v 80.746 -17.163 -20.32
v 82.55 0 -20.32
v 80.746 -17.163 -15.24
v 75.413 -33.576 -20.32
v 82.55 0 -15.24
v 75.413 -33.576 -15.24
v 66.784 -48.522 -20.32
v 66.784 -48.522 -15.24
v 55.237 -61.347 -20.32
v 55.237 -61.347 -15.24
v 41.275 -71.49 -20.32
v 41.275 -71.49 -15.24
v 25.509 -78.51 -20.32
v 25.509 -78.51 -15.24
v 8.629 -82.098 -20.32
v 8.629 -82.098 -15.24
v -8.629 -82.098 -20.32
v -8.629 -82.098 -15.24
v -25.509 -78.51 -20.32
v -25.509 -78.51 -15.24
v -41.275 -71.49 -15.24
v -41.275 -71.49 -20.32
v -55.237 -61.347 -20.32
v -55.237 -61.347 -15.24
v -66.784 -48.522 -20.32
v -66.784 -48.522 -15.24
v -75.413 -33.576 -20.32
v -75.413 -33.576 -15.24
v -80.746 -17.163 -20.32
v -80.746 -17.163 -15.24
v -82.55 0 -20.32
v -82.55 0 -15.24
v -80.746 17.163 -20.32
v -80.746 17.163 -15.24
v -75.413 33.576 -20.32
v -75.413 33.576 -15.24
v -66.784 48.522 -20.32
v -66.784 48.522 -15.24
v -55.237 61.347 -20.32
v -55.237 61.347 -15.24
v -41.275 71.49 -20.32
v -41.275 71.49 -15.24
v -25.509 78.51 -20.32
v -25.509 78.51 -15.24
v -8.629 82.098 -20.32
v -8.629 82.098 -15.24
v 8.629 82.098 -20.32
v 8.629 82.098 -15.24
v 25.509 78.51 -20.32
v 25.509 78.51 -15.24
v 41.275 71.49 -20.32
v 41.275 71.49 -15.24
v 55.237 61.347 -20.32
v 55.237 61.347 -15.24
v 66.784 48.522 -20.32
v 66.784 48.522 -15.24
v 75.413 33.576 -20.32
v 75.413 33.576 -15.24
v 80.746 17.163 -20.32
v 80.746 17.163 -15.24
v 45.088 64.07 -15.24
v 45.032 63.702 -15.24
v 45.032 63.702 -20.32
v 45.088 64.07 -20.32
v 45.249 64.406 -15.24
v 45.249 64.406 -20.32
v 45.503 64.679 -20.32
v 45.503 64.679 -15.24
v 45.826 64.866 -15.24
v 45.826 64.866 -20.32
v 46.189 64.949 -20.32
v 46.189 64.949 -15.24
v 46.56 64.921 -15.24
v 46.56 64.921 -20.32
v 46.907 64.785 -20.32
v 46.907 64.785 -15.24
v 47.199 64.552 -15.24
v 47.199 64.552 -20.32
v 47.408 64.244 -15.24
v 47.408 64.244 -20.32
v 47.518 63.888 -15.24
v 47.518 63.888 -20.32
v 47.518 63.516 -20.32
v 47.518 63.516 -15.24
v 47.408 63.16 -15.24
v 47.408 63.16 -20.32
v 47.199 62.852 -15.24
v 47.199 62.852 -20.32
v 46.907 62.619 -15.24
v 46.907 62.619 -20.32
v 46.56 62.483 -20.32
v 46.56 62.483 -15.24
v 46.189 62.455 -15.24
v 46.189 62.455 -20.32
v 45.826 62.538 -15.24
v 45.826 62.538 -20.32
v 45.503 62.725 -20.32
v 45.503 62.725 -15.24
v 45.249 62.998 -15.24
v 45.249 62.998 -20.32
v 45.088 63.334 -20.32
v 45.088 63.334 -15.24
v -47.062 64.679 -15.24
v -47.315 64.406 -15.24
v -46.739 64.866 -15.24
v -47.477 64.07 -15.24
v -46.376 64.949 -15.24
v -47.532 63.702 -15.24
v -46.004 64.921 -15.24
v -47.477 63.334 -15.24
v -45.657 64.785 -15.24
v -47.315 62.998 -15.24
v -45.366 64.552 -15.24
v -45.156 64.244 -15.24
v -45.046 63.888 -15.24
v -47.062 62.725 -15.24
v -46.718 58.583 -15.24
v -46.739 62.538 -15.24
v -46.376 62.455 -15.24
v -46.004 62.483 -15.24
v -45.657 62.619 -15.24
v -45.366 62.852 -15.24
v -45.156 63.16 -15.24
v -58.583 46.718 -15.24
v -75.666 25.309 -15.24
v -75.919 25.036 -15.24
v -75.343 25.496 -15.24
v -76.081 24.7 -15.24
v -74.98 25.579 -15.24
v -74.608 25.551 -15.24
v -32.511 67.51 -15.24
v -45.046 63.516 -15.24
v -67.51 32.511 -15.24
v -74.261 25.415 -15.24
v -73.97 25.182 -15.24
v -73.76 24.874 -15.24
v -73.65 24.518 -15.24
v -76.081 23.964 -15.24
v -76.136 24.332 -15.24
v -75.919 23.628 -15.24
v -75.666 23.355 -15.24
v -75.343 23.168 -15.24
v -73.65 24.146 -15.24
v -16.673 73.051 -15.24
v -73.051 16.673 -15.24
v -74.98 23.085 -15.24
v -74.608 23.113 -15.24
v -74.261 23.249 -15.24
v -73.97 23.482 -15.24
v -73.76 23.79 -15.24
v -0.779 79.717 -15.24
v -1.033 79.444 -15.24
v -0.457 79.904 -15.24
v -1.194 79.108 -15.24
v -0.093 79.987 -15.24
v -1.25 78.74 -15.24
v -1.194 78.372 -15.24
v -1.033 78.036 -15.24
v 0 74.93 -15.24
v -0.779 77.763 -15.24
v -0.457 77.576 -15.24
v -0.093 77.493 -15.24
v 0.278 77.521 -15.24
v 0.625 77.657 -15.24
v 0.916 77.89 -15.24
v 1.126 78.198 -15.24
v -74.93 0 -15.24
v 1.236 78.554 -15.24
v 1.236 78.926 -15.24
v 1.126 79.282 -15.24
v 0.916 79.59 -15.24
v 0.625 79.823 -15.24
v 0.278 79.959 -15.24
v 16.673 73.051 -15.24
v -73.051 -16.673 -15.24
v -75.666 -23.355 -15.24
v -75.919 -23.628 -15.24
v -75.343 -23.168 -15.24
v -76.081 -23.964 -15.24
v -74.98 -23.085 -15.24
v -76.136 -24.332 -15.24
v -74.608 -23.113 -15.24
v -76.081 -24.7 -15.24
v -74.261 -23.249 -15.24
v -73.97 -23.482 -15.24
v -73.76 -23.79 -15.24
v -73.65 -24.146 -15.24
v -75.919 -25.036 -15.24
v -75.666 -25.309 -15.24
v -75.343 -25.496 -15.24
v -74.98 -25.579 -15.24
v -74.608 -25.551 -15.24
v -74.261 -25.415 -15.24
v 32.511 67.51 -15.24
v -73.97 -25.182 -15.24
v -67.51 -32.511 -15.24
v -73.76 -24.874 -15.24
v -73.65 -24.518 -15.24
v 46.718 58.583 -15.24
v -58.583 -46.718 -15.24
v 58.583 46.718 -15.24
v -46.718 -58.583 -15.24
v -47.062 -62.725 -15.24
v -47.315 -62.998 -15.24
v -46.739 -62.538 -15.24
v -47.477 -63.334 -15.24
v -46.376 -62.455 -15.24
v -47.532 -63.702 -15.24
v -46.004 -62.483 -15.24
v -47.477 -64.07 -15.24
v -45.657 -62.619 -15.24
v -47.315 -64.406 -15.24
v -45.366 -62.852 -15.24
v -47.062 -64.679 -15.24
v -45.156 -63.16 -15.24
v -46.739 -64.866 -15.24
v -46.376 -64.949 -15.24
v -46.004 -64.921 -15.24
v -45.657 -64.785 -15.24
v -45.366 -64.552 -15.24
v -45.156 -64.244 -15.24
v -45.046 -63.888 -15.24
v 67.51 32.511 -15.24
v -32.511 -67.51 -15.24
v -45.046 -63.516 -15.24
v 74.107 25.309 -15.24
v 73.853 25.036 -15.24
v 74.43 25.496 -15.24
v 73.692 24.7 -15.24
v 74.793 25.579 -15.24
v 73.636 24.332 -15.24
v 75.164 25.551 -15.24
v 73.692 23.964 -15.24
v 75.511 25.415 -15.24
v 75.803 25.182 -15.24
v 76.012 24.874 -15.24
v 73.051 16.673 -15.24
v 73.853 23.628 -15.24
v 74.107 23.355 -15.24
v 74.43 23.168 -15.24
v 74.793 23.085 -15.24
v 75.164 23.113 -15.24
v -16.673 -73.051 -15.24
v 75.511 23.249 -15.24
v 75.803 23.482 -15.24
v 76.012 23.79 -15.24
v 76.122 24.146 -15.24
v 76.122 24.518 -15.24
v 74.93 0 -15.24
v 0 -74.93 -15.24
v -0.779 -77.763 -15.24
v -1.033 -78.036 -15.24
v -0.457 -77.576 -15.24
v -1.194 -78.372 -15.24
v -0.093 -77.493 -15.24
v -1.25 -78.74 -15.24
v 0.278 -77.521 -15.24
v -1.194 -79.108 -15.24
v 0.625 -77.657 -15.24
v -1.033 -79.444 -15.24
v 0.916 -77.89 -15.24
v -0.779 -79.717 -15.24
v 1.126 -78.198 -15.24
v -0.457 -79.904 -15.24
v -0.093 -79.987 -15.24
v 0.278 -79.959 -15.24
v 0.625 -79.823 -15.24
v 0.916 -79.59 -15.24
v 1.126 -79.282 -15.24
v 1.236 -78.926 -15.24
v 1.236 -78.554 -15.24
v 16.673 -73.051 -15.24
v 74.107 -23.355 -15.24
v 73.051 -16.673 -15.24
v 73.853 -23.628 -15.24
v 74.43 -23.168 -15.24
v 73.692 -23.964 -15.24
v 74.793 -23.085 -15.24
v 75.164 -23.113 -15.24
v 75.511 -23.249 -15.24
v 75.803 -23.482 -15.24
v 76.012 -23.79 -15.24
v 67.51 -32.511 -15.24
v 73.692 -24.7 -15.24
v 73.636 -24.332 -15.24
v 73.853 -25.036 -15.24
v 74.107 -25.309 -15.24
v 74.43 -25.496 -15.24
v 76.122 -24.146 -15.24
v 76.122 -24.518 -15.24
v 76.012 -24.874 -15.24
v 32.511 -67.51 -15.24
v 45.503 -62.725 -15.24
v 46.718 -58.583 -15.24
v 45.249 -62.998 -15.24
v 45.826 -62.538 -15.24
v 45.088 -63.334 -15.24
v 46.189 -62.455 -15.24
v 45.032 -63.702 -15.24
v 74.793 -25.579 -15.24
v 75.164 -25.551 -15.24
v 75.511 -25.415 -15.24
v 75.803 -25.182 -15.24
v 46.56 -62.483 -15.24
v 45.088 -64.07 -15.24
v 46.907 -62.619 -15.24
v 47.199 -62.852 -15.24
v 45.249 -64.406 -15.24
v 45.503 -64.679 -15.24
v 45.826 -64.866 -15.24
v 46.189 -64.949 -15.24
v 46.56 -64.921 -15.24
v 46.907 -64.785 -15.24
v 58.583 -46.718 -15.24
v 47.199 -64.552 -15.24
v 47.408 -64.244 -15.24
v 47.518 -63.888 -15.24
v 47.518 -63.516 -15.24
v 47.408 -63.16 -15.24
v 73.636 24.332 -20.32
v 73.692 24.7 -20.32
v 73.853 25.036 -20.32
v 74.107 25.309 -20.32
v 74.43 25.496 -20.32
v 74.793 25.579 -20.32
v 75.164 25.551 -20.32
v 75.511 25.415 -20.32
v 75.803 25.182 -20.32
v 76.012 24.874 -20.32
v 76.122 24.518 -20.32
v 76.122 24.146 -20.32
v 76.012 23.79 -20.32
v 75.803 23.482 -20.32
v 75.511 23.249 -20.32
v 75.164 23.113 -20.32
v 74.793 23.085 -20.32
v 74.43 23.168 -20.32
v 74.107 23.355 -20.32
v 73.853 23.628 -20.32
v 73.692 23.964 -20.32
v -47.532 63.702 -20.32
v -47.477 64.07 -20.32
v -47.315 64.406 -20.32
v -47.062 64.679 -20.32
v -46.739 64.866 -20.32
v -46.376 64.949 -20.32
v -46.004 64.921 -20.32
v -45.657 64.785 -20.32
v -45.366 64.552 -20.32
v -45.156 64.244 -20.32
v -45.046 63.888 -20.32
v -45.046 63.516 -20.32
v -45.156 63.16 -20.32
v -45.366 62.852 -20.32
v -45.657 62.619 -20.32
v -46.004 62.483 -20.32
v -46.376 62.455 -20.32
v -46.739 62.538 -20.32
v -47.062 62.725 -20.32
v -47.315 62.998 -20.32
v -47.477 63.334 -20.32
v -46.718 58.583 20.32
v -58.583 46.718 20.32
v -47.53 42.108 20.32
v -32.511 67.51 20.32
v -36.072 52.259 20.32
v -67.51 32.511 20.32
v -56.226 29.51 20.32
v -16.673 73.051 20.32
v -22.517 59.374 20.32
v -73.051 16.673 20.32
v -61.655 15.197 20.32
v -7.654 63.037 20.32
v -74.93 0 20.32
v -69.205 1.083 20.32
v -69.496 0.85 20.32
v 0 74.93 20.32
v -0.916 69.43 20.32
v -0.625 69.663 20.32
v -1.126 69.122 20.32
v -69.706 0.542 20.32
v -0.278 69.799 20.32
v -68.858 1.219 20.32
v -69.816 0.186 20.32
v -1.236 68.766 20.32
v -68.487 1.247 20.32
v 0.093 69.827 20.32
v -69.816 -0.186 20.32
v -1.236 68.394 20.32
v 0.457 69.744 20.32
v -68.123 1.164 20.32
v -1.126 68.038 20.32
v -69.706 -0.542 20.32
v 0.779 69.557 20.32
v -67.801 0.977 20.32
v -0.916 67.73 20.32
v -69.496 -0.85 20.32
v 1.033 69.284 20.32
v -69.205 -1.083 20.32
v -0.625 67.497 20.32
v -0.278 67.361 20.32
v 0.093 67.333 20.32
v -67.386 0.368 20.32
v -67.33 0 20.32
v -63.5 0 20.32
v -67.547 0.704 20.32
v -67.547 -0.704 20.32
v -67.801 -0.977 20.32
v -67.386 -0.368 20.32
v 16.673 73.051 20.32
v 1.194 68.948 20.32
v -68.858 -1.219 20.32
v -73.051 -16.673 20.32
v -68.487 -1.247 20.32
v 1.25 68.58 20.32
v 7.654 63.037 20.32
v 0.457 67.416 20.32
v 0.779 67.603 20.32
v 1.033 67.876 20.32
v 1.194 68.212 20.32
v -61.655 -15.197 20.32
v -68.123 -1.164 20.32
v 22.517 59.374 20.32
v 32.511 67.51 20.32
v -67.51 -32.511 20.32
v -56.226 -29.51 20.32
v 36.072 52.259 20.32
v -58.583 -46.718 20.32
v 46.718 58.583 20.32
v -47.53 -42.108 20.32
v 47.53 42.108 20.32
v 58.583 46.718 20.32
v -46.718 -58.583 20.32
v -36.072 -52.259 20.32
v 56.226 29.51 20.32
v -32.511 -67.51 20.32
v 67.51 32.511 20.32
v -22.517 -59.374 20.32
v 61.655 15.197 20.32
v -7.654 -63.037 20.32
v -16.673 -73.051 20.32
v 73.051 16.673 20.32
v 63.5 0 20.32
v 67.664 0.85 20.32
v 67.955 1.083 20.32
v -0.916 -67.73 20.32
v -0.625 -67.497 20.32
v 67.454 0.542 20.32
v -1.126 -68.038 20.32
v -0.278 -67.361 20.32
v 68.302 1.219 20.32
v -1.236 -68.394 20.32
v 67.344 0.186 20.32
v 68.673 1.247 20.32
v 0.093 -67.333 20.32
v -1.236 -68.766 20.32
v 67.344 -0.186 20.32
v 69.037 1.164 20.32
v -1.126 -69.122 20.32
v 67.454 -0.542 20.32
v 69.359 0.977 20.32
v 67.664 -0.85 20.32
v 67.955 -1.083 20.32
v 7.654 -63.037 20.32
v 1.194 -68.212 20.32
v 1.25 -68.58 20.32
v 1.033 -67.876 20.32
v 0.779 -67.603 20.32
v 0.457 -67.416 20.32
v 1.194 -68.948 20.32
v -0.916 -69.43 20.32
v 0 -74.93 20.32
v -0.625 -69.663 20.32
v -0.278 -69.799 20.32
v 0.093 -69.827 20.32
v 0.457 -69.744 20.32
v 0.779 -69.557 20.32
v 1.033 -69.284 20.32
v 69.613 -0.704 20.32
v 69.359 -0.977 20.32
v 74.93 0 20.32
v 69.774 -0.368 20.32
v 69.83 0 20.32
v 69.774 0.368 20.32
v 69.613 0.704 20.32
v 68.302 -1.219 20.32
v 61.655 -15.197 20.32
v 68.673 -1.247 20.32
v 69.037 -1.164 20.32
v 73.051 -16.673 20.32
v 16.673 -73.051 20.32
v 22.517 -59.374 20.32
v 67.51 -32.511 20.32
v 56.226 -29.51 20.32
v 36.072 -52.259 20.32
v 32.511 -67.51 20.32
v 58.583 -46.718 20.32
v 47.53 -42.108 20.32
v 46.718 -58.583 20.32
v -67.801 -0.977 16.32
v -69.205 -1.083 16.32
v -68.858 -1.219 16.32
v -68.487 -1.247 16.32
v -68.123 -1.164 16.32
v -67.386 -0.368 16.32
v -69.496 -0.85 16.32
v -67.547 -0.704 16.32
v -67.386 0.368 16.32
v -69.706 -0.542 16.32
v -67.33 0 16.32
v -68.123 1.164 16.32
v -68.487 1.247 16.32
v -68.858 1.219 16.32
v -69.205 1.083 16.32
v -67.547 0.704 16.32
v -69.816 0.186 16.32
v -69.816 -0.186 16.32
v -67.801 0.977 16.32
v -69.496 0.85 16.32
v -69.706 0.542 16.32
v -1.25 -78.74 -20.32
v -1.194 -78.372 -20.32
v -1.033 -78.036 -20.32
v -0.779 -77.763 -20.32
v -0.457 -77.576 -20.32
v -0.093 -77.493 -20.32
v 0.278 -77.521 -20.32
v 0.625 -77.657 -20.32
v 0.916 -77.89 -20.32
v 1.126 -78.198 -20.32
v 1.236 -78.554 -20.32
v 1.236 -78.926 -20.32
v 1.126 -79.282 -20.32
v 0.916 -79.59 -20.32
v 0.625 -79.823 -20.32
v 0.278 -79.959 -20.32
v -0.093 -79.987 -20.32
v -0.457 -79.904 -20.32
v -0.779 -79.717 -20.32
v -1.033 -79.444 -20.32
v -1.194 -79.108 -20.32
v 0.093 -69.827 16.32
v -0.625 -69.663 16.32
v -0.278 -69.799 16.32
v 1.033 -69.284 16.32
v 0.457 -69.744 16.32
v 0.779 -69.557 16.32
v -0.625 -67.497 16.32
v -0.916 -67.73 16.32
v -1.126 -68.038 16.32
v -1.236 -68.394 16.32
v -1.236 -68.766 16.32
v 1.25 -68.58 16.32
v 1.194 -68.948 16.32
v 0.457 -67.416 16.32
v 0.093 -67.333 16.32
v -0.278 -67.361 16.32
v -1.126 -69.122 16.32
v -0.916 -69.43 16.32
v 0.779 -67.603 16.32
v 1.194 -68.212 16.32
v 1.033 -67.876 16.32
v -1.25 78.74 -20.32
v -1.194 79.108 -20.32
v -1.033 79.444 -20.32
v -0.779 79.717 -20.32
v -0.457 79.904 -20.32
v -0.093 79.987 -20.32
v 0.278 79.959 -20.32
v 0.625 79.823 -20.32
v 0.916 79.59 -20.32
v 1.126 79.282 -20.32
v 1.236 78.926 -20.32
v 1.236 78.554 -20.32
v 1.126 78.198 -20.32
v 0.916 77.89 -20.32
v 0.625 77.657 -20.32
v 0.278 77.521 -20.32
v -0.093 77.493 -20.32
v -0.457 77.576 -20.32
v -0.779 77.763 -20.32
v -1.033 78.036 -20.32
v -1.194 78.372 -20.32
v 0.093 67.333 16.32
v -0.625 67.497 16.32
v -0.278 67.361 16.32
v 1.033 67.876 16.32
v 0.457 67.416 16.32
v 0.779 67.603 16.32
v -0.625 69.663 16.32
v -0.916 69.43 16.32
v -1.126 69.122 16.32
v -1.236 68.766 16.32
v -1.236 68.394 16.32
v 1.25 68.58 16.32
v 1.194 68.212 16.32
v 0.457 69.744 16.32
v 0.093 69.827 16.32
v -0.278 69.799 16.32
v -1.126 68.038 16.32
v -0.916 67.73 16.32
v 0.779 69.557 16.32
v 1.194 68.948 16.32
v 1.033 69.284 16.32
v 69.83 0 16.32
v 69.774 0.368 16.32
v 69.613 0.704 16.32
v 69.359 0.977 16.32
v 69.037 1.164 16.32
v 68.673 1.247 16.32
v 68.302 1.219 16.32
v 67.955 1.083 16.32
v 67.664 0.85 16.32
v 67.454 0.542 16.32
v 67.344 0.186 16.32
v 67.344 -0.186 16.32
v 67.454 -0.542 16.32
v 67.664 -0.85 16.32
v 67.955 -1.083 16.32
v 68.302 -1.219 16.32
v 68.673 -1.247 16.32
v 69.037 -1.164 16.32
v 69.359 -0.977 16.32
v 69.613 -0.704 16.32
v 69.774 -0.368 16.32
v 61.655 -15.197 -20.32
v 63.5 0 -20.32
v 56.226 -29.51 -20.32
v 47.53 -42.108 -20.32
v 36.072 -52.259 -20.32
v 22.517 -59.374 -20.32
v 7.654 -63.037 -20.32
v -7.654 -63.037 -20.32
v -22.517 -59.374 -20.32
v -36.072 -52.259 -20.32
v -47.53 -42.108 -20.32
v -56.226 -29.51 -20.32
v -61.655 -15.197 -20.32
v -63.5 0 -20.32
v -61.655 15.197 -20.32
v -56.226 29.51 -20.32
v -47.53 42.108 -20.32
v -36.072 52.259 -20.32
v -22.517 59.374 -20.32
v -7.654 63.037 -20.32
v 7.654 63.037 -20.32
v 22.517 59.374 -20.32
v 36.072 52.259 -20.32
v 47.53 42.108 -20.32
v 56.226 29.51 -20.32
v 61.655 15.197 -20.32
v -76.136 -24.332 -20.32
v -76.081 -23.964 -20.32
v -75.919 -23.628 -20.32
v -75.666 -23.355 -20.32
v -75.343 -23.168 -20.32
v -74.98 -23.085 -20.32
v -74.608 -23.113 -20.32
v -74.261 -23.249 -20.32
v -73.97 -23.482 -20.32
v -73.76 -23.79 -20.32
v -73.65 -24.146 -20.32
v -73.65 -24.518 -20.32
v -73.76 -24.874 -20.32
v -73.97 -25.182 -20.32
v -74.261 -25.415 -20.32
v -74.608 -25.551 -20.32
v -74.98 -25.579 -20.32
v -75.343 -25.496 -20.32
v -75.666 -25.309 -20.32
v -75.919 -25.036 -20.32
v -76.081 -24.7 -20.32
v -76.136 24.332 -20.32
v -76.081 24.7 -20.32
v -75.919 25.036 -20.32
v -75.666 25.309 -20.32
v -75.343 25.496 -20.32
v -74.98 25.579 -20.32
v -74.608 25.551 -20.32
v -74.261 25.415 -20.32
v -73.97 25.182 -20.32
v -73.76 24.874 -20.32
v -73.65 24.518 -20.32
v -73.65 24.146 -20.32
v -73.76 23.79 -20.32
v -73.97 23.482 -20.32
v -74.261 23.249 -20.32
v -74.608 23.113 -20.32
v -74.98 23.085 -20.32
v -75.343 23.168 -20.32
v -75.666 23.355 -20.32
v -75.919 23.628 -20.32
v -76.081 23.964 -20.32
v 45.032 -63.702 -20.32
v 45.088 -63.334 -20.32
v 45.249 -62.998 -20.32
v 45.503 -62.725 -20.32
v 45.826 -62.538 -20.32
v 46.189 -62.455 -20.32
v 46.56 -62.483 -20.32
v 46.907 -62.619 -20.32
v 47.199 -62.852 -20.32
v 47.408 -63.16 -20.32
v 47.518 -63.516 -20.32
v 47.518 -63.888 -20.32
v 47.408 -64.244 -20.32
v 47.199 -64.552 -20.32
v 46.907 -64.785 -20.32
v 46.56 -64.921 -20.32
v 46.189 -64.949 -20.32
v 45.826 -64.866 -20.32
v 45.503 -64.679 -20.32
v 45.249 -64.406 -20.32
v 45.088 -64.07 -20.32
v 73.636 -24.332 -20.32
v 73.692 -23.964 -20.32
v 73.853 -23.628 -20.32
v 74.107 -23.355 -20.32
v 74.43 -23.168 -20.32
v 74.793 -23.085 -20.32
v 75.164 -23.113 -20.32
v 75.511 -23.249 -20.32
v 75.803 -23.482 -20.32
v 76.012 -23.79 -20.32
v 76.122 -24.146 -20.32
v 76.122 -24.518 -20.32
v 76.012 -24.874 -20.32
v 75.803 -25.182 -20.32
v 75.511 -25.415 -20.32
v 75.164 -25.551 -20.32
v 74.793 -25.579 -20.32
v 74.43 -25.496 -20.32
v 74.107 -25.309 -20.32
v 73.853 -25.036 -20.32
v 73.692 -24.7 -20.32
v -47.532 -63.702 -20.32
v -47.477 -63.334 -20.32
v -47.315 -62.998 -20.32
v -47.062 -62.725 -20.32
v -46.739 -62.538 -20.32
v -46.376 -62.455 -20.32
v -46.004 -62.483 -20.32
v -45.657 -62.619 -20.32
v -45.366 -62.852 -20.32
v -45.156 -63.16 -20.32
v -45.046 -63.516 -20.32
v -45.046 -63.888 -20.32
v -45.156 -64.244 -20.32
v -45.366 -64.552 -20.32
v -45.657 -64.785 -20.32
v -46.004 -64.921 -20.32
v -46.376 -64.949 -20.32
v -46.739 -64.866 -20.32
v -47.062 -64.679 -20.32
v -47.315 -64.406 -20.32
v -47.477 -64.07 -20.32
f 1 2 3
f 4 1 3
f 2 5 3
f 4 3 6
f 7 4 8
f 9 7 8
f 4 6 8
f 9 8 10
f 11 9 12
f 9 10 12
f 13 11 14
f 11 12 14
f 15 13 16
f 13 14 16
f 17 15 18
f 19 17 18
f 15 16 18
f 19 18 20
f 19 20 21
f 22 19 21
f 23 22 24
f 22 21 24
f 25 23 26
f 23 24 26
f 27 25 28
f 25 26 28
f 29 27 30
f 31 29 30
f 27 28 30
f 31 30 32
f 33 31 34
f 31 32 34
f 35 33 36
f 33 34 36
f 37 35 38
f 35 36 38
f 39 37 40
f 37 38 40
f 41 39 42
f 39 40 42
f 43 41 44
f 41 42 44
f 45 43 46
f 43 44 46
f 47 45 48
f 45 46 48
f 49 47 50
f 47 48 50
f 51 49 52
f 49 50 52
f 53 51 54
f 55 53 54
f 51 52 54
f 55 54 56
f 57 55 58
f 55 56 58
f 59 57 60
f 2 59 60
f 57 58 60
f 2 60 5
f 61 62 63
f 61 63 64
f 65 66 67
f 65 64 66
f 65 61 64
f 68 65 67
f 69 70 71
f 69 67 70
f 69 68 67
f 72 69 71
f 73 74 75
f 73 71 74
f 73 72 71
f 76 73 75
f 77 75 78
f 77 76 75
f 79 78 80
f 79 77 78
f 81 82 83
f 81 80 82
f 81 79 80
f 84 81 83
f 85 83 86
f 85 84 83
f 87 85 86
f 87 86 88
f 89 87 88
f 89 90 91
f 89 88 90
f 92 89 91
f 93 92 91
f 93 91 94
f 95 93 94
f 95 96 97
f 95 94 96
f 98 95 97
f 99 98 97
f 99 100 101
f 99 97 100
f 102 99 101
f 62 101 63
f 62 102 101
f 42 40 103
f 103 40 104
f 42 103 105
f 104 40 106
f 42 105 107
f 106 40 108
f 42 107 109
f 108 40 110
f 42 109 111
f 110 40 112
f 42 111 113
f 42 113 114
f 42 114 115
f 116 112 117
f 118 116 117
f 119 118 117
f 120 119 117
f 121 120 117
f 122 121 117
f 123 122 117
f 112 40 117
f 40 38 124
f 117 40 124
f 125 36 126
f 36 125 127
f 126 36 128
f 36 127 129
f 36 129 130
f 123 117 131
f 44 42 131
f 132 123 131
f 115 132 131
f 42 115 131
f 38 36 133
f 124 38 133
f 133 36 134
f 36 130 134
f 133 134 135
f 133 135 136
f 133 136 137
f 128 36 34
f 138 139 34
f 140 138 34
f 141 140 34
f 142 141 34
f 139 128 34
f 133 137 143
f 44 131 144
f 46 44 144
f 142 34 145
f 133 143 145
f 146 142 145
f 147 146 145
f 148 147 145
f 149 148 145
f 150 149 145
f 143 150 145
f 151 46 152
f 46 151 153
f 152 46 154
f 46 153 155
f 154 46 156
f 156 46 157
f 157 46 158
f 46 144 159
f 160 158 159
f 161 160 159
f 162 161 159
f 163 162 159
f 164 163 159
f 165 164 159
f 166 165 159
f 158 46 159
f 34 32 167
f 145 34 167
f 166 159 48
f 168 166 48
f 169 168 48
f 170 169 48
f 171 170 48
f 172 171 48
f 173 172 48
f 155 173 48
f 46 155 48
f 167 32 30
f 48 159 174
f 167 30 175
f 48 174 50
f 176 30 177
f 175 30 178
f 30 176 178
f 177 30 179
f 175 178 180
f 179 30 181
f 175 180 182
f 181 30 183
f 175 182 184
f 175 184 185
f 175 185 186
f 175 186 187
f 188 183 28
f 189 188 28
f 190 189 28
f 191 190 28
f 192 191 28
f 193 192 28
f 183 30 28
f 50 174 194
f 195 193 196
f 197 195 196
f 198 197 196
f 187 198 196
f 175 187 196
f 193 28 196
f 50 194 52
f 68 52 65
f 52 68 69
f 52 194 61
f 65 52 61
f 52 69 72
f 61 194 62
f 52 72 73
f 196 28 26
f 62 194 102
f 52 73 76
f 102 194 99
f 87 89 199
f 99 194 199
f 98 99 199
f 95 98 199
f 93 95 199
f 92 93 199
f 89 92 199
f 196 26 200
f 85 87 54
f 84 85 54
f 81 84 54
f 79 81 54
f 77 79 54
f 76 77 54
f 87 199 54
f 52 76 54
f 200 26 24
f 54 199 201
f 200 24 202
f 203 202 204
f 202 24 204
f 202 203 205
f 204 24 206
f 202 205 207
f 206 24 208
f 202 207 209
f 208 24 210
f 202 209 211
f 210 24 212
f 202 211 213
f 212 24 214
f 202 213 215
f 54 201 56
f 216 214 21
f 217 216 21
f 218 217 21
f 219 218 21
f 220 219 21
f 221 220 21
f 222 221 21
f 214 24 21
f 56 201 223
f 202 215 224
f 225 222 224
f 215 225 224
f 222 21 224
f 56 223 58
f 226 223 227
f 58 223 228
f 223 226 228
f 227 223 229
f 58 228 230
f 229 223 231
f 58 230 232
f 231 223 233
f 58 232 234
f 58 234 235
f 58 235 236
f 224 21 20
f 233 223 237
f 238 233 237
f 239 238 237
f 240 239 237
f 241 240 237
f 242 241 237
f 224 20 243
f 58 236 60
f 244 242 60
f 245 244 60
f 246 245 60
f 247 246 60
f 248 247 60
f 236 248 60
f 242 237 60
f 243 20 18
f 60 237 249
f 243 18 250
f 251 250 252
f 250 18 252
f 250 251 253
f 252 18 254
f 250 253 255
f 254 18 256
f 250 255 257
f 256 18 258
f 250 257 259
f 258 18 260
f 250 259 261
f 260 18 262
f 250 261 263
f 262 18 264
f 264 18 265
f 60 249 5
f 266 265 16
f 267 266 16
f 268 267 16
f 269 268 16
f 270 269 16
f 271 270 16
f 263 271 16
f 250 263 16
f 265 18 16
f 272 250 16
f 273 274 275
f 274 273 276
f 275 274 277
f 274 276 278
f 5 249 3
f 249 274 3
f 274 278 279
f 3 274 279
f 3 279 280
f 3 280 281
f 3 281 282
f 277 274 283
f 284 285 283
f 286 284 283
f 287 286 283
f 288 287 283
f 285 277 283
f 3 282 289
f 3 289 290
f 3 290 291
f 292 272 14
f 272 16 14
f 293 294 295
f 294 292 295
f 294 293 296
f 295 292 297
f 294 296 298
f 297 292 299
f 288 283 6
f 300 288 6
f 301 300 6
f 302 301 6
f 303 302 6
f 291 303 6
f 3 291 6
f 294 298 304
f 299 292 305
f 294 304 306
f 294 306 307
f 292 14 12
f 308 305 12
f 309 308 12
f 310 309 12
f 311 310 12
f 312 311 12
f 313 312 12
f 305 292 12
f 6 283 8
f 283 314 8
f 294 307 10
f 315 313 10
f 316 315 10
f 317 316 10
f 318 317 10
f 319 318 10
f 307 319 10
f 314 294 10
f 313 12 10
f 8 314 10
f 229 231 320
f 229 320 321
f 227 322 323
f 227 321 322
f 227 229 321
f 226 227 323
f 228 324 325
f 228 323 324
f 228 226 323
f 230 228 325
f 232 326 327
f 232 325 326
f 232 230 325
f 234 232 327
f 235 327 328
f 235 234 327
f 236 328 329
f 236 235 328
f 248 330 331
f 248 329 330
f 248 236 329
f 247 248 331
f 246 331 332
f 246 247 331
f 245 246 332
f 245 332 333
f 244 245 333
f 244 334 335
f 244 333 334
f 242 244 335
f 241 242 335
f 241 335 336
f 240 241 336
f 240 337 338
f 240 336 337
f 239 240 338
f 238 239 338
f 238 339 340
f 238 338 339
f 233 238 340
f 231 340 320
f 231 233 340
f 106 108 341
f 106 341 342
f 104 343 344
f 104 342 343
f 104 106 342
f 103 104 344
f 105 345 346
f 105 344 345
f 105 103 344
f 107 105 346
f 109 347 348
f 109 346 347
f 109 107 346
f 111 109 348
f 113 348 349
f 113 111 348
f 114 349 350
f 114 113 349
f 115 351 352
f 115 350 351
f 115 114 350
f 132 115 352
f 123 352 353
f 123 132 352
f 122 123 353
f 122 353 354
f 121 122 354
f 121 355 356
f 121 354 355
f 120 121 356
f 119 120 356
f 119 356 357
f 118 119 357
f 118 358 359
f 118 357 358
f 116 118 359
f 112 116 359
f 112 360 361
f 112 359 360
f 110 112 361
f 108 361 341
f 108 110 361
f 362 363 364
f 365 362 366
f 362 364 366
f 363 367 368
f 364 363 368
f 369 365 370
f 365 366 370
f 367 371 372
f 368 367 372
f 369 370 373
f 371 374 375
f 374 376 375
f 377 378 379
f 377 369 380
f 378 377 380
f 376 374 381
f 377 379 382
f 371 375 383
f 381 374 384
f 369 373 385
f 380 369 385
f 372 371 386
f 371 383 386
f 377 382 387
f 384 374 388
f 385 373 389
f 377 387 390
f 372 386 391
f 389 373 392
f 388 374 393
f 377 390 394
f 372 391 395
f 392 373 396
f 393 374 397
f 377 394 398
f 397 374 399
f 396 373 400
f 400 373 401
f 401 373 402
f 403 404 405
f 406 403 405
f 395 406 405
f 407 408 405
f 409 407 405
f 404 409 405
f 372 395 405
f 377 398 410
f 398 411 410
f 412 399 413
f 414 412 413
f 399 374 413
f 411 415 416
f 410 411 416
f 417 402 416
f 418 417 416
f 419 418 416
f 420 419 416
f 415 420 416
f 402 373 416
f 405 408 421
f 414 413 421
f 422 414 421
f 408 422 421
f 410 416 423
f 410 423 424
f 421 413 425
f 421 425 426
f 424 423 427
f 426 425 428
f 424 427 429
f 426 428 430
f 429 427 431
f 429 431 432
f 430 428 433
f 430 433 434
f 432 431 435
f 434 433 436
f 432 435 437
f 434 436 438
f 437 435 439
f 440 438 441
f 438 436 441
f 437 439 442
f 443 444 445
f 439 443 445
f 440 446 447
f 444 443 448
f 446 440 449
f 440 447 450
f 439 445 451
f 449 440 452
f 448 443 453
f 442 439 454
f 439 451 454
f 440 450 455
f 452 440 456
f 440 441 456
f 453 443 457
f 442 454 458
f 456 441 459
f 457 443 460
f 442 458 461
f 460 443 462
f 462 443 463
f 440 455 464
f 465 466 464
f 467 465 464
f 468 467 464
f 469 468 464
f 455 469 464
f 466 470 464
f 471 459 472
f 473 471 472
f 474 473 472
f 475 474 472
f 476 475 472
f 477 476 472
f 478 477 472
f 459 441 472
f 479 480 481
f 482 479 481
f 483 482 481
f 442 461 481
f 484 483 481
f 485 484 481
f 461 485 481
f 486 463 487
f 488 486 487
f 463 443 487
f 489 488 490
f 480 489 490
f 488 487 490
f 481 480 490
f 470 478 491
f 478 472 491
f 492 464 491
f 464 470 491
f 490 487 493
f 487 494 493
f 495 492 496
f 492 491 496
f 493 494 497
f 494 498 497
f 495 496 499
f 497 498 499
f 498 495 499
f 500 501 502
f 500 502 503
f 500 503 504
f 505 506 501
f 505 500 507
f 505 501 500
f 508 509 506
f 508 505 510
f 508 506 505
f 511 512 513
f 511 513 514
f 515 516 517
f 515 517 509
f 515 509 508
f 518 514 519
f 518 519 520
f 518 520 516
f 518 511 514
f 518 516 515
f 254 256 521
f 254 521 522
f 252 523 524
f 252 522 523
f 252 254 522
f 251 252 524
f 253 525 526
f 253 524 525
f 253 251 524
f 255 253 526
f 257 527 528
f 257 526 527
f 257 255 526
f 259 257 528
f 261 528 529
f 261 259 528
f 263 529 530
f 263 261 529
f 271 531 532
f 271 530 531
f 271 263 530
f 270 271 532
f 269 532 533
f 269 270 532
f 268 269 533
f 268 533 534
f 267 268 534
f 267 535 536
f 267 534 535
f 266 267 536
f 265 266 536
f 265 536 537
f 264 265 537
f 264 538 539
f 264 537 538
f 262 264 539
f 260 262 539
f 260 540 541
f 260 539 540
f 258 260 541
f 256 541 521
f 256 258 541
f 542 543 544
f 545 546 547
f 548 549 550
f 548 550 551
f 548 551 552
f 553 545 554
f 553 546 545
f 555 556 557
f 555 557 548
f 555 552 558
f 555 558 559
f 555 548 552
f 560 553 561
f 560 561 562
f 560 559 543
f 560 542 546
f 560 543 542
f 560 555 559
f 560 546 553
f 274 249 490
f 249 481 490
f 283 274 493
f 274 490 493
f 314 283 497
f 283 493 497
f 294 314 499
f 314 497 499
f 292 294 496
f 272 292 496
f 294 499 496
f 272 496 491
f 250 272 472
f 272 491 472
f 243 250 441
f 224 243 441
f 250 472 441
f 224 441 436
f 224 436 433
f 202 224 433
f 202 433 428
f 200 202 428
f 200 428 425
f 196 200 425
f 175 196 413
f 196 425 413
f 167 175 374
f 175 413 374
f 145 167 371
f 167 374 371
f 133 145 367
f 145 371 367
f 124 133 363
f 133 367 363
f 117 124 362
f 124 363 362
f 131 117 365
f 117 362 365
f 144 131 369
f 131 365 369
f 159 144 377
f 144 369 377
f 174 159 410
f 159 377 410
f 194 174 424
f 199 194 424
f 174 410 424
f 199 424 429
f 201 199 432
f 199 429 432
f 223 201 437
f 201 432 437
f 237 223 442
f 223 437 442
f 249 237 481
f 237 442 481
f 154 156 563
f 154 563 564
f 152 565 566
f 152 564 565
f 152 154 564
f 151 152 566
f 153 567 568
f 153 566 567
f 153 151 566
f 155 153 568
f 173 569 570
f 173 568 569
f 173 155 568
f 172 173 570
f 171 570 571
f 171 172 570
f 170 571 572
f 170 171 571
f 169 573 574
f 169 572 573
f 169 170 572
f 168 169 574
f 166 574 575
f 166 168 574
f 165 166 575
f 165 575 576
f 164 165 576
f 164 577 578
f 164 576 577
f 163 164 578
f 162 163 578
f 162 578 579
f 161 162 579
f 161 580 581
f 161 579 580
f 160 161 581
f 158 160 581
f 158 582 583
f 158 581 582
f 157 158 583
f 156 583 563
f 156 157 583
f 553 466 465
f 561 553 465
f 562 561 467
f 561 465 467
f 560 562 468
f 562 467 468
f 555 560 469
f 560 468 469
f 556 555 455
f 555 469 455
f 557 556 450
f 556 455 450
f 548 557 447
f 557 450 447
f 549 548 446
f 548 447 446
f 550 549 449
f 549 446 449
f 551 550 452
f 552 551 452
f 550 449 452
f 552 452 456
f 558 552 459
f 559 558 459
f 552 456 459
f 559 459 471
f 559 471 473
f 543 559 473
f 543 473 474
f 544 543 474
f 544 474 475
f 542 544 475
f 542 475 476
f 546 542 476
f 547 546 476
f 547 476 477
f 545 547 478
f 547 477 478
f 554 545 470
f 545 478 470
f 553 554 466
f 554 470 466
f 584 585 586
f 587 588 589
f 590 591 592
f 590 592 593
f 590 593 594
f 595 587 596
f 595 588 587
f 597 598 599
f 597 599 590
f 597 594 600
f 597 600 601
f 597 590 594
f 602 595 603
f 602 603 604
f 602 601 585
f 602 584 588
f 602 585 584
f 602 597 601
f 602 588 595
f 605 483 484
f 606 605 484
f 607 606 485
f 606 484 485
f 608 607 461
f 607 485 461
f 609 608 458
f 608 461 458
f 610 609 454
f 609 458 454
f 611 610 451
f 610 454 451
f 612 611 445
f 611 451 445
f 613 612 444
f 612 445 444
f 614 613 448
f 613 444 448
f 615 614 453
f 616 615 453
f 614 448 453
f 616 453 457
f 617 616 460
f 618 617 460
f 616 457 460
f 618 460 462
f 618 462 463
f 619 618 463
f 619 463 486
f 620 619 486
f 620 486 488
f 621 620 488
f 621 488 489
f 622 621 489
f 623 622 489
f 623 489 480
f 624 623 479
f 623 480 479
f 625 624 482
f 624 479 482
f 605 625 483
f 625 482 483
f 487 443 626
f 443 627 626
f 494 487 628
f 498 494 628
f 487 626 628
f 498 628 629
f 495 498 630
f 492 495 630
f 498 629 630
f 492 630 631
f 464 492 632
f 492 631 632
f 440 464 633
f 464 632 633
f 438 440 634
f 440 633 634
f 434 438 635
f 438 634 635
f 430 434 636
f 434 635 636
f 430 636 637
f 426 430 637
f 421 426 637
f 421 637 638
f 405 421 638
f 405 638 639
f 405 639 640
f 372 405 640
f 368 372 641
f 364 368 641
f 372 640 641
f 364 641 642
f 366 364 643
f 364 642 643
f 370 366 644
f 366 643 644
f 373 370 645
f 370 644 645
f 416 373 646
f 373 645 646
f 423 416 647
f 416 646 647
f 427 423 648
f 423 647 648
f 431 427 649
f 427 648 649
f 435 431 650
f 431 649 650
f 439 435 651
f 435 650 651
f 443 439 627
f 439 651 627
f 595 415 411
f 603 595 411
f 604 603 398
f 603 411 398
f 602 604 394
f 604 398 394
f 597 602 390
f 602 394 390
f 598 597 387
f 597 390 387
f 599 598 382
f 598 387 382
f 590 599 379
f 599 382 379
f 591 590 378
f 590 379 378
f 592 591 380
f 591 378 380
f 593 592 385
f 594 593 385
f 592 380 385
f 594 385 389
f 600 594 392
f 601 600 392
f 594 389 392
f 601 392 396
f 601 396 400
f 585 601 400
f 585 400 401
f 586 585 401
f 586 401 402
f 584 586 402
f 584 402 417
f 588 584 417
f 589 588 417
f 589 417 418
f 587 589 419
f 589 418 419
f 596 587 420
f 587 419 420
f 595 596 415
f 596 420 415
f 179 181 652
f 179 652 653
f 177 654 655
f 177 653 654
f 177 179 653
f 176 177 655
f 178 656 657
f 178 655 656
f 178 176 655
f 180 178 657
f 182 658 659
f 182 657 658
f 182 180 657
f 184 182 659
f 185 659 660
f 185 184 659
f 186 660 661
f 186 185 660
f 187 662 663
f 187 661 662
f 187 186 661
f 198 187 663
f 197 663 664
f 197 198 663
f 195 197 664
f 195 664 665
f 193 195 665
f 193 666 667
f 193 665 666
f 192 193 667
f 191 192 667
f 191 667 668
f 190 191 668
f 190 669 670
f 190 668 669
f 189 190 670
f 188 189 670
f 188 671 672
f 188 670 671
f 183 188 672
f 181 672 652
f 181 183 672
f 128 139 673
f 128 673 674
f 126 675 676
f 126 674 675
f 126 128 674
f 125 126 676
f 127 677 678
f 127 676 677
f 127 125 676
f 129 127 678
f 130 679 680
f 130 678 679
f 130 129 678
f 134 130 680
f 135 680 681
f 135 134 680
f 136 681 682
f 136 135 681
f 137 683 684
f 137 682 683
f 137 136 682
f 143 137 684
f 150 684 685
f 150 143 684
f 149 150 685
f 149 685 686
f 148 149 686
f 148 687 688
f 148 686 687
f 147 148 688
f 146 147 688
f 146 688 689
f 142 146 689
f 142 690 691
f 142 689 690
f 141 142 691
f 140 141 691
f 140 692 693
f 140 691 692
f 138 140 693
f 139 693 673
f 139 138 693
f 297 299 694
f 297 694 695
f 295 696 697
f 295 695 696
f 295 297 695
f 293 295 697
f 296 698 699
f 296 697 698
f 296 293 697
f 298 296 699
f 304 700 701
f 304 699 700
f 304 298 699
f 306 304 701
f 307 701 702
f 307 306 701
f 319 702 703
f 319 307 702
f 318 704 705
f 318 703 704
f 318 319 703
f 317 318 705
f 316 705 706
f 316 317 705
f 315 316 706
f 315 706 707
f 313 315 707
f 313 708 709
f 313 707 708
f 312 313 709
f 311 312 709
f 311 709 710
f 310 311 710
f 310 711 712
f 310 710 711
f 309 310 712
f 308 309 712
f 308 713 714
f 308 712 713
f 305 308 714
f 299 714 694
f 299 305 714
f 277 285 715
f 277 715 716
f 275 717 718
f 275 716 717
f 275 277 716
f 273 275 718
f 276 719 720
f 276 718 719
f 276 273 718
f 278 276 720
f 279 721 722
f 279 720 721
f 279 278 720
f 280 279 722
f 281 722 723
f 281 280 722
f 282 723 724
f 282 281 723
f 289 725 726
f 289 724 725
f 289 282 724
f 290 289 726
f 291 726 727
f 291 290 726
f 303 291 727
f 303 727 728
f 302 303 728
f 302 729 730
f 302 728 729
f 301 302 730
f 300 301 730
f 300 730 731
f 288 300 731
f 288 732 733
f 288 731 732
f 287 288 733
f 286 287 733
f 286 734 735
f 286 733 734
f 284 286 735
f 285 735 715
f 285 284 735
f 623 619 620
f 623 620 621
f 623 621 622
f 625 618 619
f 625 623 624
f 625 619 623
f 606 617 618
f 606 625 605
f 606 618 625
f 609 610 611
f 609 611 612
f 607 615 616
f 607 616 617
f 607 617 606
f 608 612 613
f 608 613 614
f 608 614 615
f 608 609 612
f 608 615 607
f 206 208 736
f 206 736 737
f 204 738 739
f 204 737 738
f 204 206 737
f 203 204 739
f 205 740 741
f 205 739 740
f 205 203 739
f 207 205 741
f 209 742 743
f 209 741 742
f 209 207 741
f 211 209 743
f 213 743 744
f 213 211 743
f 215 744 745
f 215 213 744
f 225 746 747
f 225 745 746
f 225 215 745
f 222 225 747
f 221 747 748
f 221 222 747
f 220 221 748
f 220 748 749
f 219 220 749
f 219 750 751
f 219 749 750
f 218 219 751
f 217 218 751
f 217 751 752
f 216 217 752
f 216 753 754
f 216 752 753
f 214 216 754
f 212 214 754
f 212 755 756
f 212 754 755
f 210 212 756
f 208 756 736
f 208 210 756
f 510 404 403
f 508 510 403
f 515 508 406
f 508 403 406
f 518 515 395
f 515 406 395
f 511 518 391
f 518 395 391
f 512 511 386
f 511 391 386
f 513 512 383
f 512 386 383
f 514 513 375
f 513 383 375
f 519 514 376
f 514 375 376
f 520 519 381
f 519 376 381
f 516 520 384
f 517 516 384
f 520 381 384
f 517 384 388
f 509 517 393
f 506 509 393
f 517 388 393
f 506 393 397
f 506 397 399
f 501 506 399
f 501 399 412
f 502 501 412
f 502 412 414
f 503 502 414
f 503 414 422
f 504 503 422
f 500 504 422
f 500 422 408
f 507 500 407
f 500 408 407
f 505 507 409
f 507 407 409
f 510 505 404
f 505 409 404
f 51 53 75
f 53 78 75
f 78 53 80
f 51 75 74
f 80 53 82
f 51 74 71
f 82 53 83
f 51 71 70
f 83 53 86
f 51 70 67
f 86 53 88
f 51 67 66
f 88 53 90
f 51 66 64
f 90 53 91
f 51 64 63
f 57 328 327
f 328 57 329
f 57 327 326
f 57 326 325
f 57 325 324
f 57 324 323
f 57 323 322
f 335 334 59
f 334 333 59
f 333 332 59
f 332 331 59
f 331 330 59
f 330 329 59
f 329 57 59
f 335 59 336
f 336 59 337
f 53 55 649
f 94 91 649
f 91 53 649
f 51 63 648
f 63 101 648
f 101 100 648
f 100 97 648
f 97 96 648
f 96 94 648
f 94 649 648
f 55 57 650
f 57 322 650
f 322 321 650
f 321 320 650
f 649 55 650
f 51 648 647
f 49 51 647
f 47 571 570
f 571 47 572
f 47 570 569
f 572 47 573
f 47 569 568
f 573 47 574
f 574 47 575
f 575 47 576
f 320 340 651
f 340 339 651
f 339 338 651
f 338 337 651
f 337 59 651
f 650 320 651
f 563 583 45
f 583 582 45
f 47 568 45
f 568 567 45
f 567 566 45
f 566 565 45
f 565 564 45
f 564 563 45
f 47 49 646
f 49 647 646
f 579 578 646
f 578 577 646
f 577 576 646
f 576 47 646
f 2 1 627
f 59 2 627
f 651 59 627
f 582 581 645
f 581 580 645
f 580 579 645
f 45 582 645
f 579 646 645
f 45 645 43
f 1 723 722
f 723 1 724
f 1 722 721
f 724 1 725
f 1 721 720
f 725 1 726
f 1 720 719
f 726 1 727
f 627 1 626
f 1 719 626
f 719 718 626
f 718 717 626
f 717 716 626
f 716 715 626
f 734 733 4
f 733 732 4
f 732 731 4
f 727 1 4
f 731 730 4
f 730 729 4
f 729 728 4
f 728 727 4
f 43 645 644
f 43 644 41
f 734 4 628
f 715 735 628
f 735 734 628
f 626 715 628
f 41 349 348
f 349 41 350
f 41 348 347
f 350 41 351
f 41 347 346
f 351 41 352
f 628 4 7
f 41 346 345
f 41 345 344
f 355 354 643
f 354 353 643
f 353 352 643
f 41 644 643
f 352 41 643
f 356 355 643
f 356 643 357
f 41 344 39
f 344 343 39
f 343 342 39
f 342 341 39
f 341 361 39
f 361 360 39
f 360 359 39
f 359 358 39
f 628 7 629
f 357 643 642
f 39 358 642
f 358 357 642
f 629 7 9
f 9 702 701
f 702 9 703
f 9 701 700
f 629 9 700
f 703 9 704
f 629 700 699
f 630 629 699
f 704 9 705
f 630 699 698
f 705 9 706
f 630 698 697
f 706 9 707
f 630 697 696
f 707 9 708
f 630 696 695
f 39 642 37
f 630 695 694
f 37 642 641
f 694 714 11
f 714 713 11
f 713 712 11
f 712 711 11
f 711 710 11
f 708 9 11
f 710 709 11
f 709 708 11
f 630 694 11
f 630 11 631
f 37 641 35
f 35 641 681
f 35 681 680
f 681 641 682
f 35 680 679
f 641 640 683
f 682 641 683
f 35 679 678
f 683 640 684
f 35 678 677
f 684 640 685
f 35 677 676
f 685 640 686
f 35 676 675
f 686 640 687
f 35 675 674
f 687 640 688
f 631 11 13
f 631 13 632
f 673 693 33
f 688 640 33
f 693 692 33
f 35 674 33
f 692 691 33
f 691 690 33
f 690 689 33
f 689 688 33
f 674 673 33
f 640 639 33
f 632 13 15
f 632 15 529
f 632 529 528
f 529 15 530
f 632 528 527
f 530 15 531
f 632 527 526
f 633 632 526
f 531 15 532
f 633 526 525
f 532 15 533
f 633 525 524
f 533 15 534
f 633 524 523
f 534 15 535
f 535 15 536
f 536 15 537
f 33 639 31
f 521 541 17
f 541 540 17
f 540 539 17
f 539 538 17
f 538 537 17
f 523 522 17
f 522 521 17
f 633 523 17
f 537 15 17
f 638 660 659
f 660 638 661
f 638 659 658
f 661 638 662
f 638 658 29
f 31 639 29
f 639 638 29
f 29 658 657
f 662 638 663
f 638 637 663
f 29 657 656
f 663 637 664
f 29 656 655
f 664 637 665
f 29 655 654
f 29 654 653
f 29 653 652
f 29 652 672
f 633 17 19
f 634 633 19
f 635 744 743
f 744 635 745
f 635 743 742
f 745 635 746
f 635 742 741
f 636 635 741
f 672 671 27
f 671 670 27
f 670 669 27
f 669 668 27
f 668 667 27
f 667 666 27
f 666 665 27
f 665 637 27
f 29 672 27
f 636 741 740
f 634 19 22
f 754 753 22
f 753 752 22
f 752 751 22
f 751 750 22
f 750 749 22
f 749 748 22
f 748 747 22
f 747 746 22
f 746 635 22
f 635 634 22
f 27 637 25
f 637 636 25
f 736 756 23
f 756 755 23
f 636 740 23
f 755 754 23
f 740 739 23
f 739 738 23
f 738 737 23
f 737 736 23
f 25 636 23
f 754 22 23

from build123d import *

# Parameters (mm, degrees)
SKETCH2_R                        = 1.25
INTERNAL_MOUNTING_HOLES_DEPTH    = 4
ENDCAP_MOUNTING_HOLES_DEPTH      = 124.614783097
ENDCAP_MOUNTING_HOLES_DEPTH_BACK = 124.614783097
SKETCH3_R                        = 1.25


with BuildPart() as part:
    # Sketch1 → Base Boss (revolve)
    with BuildSketch(Plane(origin=(0, 0, 0), x_dir=(1, 0, 0), z_dir=(0, 1, 0))):
        Polygon((63.5, 20.32), (82.55, 20.32), (82.55, 15.24), (74.93, 15.24), (74.93, -20.32), (63.5, -20.32), align=None)
    revolve(axis=Axis((0, 0, 0), (0, 0, -1)))

    # Sketch2 → Internal Mounting Holes (cut)
    with BuildSketch(Plane.XY.offset(20.32)):
        with Locations((0, 68.58)):
            Circle(SKETCH2_R)
        with Locations((68.58, 0)):
            Circle(SKETCH2_R)
        with Locations((0, -68.58)):
            Circle(SKETCH2_R)
        with Locations((-68.58, 0)):
            Circle(SKETCH2_R)
    extrude(amount=-INTERNAL_MOUNTING_HOLES_DEPTH, mode=Mode.SUBTRACT)

    # Sketch3 → Endcap Mounting Holes (cut, two sides: drawn at the far end of the back side and taken through both)
    with BuildSketch(Plane(origin=(0, 0, -20.32), x_dir=(-1, 0, 0), z_dir=(0, 0, -1)).offset(-ENDCAP_MOUNTING_HOLES_DEPTH_BACK)):
        with Locations((0, 78.74)):
            Circle(SKETCH3_R)
        with Locations((46.282210766, 63.701998137)):
            Circle(SKETCH3_R)
        with Locations((74.886190093, 24.331998137)):
            Circle(SKETCH3_R)
        with Locations((74.886190093, -24.331998137)):
            Circle(SKETCH3_R)
        with Locations((46.282210766, -63.701998137)):
            Circle(SKETCH3_R)
        with Locations((0, -78.74)):
            Circle(SKETCH3_R)
        with Locations((-46.282210766, -63.701998137)):
            Circle(SKETCH3_R)
        with Locations((-74.886190093, -24.331998137)):
            Circle(SKETCH3_R)
        with Locations((-74.886190093, 24.331998137)):
            Circle(SKETCH3_R)
        with Locations((-46.282210766, 63.701998137)):
            Circle(SKETCH3_R)
    extrude(amount=ENDCAP_MOUNTING_HOLES_DEPTH + ENDCAP_MOUNTING_HOLES_DEPTH_BACK, mode=Mode.SUBTRACT)


solid = part.part
